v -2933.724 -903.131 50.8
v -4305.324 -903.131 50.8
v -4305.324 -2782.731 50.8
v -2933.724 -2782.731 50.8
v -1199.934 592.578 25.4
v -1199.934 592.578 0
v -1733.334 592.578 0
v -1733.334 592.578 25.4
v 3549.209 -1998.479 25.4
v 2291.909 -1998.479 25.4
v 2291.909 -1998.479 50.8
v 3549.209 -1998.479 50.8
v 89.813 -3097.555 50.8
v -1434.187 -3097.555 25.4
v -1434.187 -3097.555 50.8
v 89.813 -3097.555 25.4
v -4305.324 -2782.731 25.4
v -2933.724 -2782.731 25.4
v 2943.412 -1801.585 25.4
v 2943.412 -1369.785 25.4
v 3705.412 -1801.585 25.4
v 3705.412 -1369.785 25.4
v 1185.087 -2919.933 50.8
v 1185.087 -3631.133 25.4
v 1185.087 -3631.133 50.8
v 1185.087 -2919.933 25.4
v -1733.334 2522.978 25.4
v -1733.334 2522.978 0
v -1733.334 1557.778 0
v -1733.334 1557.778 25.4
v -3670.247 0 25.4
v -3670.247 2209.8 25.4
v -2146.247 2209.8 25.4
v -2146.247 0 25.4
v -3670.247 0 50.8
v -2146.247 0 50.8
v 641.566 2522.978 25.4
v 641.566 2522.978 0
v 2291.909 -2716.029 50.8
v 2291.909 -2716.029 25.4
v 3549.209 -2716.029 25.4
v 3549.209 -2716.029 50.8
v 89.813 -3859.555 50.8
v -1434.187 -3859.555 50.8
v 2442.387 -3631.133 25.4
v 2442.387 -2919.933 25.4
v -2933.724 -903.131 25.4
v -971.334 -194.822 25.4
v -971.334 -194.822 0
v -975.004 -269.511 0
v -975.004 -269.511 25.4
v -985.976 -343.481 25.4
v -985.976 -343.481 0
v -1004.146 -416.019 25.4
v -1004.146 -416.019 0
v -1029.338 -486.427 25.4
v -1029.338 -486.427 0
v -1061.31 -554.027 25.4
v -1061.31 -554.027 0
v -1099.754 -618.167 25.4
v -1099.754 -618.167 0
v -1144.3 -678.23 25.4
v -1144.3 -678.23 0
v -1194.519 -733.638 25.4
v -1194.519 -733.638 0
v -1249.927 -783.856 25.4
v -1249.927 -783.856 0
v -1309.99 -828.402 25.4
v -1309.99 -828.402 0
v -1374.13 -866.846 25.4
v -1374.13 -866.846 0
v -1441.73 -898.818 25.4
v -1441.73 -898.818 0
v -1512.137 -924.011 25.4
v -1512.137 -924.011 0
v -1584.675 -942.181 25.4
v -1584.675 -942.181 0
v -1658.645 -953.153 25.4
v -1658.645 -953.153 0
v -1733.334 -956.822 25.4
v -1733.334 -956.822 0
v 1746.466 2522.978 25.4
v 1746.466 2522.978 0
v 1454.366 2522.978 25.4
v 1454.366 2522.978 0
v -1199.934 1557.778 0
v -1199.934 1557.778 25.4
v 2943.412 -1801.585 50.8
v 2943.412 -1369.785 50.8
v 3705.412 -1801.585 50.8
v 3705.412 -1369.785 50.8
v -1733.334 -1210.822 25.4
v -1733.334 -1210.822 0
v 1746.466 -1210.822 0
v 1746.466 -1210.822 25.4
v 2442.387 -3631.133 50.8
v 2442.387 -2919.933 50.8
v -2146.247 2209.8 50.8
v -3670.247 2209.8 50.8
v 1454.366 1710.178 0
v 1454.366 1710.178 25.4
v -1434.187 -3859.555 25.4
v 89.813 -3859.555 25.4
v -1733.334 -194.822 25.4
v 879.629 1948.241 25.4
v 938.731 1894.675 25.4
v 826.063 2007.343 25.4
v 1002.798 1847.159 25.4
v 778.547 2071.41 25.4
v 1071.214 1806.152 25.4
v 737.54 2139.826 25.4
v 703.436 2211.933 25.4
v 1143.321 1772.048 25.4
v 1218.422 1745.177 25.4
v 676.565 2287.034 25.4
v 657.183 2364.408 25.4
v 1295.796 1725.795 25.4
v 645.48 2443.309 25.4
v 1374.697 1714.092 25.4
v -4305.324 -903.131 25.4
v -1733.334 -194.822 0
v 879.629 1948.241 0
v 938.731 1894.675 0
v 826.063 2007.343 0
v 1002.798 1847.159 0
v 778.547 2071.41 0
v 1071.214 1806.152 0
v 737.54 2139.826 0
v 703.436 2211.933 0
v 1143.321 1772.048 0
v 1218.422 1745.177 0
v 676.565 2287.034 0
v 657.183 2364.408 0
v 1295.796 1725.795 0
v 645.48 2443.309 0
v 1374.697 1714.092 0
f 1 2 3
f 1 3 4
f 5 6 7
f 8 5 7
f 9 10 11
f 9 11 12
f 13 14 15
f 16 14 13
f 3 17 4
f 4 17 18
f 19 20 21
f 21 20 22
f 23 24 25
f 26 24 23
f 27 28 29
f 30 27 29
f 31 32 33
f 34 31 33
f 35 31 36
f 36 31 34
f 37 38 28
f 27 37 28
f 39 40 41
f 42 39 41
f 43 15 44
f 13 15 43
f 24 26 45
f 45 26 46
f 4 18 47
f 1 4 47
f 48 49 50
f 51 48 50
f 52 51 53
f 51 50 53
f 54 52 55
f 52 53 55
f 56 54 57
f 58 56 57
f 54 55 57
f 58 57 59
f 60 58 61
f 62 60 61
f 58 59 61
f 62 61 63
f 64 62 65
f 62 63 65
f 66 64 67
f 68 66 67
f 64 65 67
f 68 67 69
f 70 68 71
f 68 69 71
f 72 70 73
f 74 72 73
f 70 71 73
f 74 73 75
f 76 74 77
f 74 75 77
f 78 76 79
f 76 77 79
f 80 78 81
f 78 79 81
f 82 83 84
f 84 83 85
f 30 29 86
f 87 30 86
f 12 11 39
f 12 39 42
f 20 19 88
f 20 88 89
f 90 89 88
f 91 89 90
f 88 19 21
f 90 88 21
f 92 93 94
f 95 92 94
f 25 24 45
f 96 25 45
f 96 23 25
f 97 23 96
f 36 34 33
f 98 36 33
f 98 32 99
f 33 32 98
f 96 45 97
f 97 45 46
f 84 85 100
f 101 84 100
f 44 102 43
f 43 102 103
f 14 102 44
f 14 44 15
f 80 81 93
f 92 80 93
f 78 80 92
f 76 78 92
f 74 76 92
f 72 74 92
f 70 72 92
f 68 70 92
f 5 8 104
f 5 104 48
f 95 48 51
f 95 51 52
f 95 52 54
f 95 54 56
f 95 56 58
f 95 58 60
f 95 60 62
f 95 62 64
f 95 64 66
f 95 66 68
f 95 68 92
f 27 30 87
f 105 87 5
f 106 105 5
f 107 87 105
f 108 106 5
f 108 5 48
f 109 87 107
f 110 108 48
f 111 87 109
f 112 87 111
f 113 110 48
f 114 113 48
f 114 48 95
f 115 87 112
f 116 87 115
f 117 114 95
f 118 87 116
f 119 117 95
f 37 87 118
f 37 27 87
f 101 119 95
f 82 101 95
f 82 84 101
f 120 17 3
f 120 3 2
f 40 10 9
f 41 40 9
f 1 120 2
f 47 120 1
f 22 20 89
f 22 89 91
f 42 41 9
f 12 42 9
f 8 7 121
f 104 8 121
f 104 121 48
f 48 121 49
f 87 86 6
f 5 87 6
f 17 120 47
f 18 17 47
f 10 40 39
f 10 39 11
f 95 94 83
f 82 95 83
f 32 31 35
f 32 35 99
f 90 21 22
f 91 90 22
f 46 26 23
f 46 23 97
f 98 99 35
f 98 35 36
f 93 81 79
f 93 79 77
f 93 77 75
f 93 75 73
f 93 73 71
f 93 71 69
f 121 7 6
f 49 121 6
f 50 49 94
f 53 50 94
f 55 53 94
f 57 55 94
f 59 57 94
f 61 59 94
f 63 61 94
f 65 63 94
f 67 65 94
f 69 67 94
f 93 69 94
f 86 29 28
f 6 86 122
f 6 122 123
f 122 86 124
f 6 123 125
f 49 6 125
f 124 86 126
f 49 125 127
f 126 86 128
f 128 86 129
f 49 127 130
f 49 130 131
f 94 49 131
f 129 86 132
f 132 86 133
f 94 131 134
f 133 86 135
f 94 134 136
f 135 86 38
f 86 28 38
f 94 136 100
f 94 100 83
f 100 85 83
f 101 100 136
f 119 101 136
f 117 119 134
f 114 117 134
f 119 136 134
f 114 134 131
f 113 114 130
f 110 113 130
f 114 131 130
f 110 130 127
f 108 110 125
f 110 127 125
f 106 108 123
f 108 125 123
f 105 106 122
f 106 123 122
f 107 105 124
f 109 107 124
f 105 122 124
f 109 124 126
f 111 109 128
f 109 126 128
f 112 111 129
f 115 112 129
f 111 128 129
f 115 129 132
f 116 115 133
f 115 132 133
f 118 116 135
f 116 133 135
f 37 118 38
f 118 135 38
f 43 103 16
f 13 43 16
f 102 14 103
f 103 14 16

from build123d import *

# Parameters (mm, degrees)
F1_DEPTH  = 25.4
F2_W      = 1524
F2_H      = 2209.8
F3_DEPTH  = 25.4
F4_W      = 1371.6
F4_H      = 1879.6
F5_DEPTH  = 25.4
F6_W      = 1524
F6_H      = 762
F7_DEPTH  = 25.4
F8_W      = 1257.3
F8_H      = 711.2
F9_DEPTH  = 25.4
F10_W     = 762
F10_H     = 431.8
F11_DEPTH = 25.4
F12_W     = 1257.3
F12_H     = 717.55
F13_DEPTH = 25.4


with BuildPart() as f1:
    # F0 (on Top) → F1 (new body)
    with BuildSketch(Plane.XY):
        with BuildLine():
            Line((641.565705, 2522.977748), (-1733.334295, 2522.977748))
            Line((-1733.334295, 2522.977748), (-1733.334295, 1557.777748))
            Line((-1733.334295, 1557.777748), (-1199.934295, 1557.777748))
            Line((-1199.934295, 1557.777748), (-1199.934295, 592.577748))
            Line((-1199.934295, 592.577748), (-1733.334295, 592.577748))
            Line((-1733.334295, 592.577748), (-1733.334295, -194.822252))
            Line((-1733.334295, -194.822252), (-971.334295, -194.822252))
            ThreePointArc((-971.334295, -194.822252), (-1194.518928, -733.637619), (-1733.334295, -956.822252))
            Line((-1733.334295, -956.822252), (-1733.334295, -1210.822252))
            Line((-1733.334295, -1210.822252), (1746.465705, -1210.822252))
            Line((1746.465705, -1210.822252), (1746.465705, 2522.977748))
            Line((1746.465705, 2522.977748), (1454.365705, 2522.977748))
            Line((1454.365705, 2522.977748), (1454.365705, 1710.177748))
            ThreePointArc((1454.365705, 1710.177748), (879.629313, 1948.241356), (641.565705, 2522.977748))
        make_face()
    extrude(amount=F1_DEPTH)


with BuildPart() as f3:
    # F2 (on face) → F3 (new body)
    with BuildSketch(Plane.XY.offset(25.4)):
        with Locations((-2908.247259, 1104.9)):
            Rectangle(F2_W, F2_H)
    extrude(amount=F3_DEPTH)


with BuildPart() as f5:
    # F4 (on face) → F5 (new body)
    with BuildSketch(Plane.XY.offset(25.4)):
        with Locations((-3619.52424, -1842.931094)):
            Rectangle(F4_W, F4_H)
    extrude(amount=F5_DEPTH)


with BuildPart() as f7:
    # F6 (on face) → F7 (new body)
    with BuildSketch(Plane.XY.offset(25.4)):
        with Locations((-672.187269, -3478.55516)):
            Rectangle(F6_W, F6_H)
    extrude(amount=F7_DEPTH)


with BuildPart() as f9:
    # F8 (on face) → F9 (new body)
    with BuildSketch(Plane.XY.offset(25.4)):
        with Locations((1813.736558, -3275.53344)):
            Rectangle(F8_W, F8_H)
    extrude(amount=F9_DEPTH)


with BuildPart() as f11:
    # F10 (on face) → F11 (new body)
    with BuildSketch(Plane.XY.offset(25.4)):
        with Locations((3324.412107, -1585.68509)):
            Rectangle(F10_W, F10_H)
    extrude(amount=F11_DEPTH)


with BuildPart() as f13:
    # F12 (on face) → F13 (new body)
    with BuildSketch(Plane.XY.offset(25.4)):
        with Locations((2920.559168, -2357.254391)):
            Rectangle(F12_W, F12_H)
    extrude(amount=F13_DEPTH)


solid = Compound([f1.part, f3.part, f5.part, f7.part, f9.part, f11.part, f13.part])
